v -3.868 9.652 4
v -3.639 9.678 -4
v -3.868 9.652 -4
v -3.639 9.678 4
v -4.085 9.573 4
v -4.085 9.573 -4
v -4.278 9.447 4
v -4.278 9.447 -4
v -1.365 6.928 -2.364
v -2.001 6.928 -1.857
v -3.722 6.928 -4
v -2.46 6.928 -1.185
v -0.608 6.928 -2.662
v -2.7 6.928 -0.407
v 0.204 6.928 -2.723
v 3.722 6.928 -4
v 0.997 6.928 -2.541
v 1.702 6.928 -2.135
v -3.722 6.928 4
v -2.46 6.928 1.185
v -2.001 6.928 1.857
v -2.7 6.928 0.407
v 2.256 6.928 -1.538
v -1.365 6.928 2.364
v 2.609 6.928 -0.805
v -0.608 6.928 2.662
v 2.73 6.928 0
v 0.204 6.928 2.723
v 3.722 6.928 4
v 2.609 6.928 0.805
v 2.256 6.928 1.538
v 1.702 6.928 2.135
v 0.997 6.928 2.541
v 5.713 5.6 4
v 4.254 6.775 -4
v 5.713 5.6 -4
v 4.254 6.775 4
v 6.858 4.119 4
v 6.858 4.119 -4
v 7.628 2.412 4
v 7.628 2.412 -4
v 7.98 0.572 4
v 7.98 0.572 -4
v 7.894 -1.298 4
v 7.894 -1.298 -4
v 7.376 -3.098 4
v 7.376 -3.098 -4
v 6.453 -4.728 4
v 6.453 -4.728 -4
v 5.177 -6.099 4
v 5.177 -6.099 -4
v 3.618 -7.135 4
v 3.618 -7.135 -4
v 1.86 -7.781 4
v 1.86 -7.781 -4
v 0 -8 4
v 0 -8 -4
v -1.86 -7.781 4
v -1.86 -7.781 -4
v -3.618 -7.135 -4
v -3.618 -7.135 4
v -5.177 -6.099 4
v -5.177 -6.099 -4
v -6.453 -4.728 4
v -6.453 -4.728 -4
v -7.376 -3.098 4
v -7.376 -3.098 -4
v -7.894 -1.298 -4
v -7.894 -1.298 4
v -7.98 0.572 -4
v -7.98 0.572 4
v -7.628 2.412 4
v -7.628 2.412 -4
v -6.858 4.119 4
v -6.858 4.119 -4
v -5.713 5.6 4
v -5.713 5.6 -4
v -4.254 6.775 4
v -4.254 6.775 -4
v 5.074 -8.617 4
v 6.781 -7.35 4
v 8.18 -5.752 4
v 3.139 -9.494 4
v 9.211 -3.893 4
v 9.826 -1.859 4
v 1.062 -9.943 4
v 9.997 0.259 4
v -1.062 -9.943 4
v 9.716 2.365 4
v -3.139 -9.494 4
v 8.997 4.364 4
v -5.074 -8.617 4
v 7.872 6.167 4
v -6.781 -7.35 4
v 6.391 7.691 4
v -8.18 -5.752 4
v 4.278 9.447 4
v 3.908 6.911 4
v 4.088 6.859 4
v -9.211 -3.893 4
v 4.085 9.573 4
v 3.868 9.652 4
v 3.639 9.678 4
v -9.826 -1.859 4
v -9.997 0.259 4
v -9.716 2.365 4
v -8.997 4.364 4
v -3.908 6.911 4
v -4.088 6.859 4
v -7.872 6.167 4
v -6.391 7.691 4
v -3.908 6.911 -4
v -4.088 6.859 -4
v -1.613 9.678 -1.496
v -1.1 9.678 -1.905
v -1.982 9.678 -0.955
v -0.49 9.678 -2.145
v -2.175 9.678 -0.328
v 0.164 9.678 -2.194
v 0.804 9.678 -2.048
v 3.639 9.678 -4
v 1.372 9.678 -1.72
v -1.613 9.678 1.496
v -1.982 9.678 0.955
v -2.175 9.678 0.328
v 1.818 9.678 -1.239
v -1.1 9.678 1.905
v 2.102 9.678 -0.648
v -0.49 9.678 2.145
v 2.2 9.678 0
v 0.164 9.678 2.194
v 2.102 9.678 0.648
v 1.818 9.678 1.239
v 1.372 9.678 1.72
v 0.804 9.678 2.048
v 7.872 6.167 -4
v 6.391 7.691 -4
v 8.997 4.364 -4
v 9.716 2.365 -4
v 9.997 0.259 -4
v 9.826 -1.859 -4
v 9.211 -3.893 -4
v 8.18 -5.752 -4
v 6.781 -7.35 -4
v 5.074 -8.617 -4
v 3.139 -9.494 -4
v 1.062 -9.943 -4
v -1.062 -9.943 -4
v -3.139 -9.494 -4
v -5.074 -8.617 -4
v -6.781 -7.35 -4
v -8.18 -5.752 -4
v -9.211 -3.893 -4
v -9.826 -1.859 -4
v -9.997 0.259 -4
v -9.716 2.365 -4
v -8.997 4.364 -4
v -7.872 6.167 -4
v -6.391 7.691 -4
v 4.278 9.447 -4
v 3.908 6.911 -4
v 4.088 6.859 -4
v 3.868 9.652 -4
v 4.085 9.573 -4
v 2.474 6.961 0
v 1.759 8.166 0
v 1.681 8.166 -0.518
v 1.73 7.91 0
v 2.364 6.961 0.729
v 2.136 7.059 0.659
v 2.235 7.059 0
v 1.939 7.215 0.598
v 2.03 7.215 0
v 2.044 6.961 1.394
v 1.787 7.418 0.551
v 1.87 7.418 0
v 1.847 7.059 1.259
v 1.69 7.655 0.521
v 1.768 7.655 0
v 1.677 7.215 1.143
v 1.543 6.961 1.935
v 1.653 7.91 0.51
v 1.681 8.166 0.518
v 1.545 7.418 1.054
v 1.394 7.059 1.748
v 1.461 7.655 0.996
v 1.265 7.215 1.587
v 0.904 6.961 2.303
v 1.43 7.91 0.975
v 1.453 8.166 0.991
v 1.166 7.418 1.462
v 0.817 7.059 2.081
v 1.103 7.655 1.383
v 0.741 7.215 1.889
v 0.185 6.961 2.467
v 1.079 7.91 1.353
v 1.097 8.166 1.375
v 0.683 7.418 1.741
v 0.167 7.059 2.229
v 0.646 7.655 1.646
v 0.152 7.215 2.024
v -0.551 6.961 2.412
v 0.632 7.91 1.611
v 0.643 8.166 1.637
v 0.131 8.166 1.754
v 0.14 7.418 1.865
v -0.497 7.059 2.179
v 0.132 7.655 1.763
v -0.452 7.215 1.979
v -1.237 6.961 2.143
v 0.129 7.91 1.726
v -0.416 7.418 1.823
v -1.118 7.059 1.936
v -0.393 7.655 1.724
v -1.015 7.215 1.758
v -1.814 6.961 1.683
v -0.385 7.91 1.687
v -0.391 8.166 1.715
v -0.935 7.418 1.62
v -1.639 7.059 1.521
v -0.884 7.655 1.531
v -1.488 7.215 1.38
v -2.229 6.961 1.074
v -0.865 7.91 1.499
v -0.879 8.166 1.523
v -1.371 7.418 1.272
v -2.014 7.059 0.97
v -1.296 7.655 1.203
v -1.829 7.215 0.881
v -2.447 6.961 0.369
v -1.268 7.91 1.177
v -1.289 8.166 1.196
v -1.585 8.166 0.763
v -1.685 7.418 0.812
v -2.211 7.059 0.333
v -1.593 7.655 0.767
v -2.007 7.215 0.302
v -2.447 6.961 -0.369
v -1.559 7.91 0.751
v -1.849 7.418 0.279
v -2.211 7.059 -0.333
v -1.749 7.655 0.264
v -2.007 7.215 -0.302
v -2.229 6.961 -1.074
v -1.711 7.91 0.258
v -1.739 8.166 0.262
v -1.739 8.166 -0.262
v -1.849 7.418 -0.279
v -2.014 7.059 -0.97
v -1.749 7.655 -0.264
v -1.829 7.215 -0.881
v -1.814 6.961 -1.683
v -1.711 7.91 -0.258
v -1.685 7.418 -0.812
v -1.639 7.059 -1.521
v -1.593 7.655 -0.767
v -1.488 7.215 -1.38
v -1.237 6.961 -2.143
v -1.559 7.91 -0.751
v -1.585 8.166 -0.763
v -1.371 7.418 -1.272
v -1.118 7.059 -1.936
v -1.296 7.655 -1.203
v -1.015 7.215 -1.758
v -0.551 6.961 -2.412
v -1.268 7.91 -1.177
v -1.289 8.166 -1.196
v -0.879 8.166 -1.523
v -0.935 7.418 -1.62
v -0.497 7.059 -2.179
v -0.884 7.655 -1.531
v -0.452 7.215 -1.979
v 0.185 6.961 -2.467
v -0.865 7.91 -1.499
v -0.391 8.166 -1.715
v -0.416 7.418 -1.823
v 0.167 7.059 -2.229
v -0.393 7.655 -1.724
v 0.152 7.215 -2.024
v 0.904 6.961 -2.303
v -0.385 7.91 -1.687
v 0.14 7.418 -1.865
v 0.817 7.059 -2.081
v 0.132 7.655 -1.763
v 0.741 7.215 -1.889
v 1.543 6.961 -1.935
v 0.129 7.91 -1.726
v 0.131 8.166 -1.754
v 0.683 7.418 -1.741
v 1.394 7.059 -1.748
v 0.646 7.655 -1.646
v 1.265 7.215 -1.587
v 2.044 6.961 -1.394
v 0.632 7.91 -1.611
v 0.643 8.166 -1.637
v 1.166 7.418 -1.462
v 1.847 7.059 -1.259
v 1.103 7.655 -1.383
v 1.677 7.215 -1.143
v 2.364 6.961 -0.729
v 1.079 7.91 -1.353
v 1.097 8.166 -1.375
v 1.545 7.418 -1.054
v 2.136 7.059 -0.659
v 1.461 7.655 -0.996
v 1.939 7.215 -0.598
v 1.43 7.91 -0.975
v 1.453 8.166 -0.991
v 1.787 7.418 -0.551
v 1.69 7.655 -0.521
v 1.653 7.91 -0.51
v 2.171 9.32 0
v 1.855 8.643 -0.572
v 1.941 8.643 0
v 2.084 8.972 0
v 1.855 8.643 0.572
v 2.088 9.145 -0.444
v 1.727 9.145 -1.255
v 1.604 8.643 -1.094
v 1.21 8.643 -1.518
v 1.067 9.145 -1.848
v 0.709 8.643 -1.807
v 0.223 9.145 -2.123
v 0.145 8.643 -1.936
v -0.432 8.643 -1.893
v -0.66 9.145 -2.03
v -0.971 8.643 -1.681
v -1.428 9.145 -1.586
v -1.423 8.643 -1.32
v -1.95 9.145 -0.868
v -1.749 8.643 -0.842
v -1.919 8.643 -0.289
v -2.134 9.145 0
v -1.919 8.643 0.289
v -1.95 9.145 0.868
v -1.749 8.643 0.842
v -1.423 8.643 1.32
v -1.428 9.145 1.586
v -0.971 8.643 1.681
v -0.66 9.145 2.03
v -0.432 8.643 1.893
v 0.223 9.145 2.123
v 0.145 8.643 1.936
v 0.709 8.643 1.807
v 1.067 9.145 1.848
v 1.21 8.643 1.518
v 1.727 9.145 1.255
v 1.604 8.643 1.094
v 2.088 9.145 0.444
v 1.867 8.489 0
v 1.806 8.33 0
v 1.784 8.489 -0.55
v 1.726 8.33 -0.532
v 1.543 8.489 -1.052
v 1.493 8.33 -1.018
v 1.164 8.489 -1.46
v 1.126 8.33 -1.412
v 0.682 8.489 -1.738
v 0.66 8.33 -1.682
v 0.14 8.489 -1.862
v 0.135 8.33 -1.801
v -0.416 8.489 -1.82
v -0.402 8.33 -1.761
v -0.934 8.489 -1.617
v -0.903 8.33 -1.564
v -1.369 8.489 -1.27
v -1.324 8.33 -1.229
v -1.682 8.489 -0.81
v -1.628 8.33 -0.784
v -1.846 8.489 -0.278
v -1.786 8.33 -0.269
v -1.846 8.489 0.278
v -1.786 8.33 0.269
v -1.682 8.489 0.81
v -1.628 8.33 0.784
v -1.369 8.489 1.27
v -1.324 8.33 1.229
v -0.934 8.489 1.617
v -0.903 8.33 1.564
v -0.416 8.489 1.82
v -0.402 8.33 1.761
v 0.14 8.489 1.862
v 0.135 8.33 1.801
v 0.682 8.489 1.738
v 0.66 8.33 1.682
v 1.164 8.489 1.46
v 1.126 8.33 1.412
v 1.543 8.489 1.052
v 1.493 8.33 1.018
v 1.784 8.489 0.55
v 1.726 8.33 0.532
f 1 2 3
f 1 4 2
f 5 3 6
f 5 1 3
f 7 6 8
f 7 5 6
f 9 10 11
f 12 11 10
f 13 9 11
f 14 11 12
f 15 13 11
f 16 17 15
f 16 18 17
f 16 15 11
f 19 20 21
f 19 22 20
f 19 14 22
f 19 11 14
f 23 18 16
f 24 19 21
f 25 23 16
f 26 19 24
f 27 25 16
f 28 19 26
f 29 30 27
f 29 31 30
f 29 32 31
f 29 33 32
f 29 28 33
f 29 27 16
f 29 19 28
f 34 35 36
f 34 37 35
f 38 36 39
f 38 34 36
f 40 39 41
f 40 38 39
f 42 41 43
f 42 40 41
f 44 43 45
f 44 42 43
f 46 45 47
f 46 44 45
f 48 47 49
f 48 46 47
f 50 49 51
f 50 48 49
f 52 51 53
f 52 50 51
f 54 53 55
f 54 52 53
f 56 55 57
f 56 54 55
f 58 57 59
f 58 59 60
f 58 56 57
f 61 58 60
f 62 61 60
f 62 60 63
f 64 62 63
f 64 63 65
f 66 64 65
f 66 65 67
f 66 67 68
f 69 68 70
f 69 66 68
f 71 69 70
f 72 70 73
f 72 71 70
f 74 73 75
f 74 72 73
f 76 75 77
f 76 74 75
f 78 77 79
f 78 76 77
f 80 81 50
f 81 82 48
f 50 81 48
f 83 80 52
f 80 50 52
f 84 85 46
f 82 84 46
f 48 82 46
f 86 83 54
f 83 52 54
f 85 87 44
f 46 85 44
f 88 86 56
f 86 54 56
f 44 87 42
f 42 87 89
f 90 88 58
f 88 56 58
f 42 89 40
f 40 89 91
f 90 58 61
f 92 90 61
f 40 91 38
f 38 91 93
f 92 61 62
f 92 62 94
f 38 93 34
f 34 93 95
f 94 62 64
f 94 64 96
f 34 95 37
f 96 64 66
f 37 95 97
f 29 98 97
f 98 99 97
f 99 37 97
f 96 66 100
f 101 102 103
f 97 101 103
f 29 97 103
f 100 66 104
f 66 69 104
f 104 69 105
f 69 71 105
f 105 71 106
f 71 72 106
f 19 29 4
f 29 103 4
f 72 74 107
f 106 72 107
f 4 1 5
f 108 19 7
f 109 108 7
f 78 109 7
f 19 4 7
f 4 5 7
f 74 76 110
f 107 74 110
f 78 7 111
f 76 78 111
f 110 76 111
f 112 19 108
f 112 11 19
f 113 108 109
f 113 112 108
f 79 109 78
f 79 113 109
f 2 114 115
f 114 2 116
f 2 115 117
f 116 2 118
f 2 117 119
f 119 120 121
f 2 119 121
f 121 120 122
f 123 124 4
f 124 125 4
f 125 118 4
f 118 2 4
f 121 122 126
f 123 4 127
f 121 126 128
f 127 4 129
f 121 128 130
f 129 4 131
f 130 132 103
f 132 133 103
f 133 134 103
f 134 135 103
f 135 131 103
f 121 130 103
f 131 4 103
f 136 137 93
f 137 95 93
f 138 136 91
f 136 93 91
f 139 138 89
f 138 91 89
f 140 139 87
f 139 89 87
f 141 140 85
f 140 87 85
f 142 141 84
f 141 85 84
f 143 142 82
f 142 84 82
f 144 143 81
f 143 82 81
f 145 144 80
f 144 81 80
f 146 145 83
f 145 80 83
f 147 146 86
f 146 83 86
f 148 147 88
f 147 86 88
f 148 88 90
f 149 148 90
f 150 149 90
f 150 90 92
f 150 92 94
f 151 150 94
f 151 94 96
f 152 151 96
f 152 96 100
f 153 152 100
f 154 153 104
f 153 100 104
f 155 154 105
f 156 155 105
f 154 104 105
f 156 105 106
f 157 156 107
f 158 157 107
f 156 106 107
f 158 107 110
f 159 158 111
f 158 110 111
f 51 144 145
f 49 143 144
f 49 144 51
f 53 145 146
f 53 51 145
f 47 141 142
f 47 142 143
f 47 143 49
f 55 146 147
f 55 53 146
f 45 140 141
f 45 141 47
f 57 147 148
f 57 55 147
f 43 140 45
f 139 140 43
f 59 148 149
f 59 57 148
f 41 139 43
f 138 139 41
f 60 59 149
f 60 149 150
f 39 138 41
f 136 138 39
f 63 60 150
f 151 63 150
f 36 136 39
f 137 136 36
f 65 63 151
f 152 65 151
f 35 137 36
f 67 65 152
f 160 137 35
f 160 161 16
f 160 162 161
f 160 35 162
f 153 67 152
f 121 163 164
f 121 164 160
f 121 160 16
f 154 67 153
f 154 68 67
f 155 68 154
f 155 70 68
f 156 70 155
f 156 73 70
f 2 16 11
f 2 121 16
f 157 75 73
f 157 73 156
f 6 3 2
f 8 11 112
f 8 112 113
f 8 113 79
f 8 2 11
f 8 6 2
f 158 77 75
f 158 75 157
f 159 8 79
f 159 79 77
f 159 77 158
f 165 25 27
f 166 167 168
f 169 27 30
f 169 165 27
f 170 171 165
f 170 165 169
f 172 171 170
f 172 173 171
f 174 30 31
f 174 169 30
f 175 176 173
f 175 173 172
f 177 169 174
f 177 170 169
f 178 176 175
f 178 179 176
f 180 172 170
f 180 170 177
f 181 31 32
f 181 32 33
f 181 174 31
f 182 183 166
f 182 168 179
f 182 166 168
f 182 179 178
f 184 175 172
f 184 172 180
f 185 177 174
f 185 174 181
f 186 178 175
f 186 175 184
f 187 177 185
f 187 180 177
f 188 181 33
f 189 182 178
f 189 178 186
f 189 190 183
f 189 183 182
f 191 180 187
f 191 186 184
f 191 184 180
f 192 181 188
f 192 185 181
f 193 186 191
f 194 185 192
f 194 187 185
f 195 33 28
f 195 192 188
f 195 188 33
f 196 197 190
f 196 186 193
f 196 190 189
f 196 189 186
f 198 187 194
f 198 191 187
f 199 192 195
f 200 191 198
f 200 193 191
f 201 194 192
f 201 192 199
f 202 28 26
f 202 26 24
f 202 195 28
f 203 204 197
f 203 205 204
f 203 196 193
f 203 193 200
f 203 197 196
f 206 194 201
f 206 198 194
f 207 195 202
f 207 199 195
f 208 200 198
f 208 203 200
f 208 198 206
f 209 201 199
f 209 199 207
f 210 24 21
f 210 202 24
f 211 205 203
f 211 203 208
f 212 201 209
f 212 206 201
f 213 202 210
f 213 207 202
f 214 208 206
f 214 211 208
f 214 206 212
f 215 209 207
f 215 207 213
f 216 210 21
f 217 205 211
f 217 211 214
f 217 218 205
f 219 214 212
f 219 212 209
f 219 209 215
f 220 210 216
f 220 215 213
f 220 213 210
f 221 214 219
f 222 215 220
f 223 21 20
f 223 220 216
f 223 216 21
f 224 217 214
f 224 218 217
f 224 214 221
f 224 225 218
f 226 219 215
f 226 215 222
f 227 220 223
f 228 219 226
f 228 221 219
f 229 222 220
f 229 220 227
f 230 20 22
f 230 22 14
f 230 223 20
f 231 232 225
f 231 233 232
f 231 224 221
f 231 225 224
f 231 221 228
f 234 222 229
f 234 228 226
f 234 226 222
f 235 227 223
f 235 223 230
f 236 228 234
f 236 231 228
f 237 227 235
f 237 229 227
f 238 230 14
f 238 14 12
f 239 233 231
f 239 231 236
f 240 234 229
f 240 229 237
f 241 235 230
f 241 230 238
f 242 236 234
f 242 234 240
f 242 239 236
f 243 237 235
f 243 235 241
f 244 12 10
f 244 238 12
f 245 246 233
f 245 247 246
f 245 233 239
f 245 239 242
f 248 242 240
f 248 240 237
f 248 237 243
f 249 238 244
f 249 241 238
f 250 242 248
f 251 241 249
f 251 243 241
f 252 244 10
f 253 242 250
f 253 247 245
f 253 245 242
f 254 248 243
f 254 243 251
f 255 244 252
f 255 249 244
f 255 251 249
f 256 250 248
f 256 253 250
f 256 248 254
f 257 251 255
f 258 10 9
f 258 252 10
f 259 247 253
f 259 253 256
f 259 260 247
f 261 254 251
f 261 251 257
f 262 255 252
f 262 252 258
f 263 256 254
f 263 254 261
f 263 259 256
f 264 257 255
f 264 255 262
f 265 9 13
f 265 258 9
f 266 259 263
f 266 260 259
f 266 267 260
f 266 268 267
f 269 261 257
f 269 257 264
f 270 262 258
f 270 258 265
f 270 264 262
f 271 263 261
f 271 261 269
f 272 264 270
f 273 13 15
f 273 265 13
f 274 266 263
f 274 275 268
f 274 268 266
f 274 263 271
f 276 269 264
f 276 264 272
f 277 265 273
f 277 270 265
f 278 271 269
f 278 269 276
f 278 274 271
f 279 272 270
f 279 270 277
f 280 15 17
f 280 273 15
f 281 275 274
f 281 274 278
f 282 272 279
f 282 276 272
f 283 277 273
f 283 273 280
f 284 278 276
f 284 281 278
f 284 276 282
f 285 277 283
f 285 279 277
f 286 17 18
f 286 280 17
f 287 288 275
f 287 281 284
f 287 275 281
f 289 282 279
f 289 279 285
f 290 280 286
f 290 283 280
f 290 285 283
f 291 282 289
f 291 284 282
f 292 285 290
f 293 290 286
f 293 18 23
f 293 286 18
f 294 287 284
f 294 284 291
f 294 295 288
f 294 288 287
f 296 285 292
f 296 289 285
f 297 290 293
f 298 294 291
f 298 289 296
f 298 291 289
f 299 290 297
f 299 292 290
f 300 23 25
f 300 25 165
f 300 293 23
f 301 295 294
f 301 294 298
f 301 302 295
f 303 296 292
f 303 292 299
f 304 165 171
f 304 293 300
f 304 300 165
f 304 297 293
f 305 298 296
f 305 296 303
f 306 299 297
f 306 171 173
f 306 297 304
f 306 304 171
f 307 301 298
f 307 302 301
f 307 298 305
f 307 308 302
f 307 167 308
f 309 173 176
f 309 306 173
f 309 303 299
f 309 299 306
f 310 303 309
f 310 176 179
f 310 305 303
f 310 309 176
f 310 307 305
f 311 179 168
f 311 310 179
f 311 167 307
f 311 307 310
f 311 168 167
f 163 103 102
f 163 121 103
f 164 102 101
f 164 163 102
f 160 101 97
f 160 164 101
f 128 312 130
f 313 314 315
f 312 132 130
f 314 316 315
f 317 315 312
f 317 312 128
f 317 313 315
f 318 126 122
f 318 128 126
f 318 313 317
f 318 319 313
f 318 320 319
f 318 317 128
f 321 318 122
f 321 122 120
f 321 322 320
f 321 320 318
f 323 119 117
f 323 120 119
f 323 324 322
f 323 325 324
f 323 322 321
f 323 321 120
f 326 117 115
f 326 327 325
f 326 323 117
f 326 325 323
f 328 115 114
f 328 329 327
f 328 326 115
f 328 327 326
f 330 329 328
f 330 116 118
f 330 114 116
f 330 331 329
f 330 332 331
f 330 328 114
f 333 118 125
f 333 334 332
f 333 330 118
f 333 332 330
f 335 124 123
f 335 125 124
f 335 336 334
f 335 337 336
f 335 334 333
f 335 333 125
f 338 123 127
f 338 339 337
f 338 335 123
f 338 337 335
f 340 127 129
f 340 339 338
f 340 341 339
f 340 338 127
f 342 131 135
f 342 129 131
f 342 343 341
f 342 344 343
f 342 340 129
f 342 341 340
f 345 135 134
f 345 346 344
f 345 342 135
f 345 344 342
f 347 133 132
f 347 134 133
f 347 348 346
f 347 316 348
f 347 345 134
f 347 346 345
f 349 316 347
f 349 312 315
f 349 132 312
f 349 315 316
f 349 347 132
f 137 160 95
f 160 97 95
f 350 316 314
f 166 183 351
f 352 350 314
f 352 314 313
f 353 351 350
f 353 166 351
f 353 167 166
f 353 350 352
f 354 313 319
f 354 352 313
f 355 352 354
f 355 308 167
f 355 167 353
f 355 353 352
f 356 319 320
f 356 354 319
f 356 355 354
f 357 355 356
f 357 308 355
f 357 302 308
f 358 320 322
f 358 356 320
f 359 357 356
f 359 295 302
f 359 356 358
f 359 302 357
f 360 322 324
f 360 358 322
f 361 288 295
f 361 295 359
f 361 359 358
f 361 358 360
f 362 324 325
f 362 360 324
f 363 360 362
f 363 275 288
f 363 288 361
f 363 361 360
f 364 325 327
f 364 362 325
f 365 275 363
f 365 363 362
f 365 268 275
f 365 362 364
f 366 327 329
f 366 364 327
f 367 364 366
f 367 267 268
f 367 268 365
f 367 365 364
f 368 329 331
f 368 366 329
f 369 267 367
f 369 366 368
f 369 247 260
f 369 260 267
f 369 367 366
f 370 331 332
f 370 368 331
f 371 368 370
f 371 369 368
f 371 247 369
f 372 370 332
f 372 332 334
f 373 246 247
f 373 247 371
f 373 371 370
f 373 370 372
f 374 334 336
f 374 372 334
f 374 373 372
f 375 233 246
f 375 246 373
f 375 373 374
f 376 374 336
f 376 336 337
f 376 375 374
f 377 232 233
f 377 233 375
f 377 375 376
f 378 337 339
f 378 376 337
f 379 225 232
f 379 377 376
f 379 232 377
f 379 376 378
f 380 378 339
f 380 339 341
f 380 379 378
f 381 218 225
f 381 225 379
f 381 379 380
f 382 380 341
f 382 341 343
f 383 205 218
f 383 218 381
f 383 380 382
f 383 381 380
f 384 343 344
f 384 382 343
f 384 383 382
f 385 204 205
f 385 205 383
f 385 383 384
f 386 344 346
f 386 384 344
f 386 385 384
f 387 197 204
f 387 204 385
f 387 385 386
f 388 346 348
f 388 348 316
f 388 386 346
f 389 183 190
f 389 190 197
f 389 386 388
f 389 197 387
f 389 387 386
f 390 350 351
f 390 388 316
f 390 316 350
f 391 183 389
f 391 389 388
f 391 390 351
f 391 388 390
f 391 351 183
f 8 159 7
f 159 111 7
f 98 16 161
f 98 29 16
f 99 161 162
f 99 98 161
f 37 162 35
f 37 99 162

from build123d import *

# Parameters (mm, degrees)
BOSS_EXTRUDE1_DEPTH = 4
FILLET2_R           = 1
FILLET3_R           = 1


with BuildPart() as part:
    # Sketch1 → Boss-Extrude1 (new, symmetric)
    with BuildSketch(Plane.XY):
        with BuildLine():
            Line((-4, 9.67820323), (4, 9.67820323))
            Line((4, 9.67820323), (6.391333959, 7.690958992))
            ThreePointArc((6.391333959, 7.690958992), (0, -10), (-6.391333959, 7.690958992))
            Line((-6.391333959, 7.690958992), (-4, 9.67820323))
        make_face()
        with BuildLine():
            Line((-4, 6.92820323), (4, 6.92820323))
            ThreePointArc((4, 6.92820323), (0, -8), (-4, 6.92820323))
        make_face(mode=Mode.SUBTRACT)
    extrude(amount=BOSS_EXTRUDE1_DEPTH, both=True)

    # Sketch2 → Cut-Revolve1 (revolve, cut)
    with BuildSketch(Plane.XY):
        with BuildLine():
            Line((0, 6.72820323), (0, 11.87820323))
            ThreePointArc((0, 11.87820323), (1.886484437, 10.810093892), (1.941176471, 8.642909113))
            ThreePointArc((1.941176471, 8.642909113), (1.761207875, 8.175401262), (1.7, 7.67820323))
            Line((1.7, 7.67820323), (1.7, 6.72820323))
            Line((1.7, 6.72820323), (0, 6.72820323))
        make_face()
    revolve(axis=Axis((0, 6.72820323, 0), (0, 1, 0)), mode=Mode.SUBTRACT)

    # Fillet2
    # the kernel refuses this fillet: 1 mm, written as the material it takes off along each edge
    with BuildSketch(Plane(origin=(0, 6.92820323, 0), x_dir=(1, 0, 0), z_dir=(0, 0, -1))) as fillet2_piece_1:
        with BuildLine():
            CenterArc((2.730196097, -1), FILLET2_R, 90, 103.774146998)
            Line((1.758954285, -1.238095238), (1.661830104, -1.261904762))
            ThreePointArc((1.661830104, -1.261904762), (1.6, -0.75), (1.6, 0))
            Line((1.6, 0), (1.7, 0.1))
            Line((1.7, 0.1), (2.730196097, 0.1))
            Line((2.730196097, 0.1), (2.730196097, 0))
        make_face()
    revolve(axis=Axis((0, 6.92820323, 0), (0, -1, 0)), mode=Mode.SUBTRACT)

    # Fillet3
    fillet3_edges = [part.edges().sort_by_distance(p)[0] for p in [
        (-4, 6.92820323, 0),
        (4, 6.92820323, 0),
        (-4, 9.67820323, 0),
        (4, 9.67820323, 0),
    ]]
    fillet(fillet3_edges, radius=FILLET3_R)


solid = part.part
